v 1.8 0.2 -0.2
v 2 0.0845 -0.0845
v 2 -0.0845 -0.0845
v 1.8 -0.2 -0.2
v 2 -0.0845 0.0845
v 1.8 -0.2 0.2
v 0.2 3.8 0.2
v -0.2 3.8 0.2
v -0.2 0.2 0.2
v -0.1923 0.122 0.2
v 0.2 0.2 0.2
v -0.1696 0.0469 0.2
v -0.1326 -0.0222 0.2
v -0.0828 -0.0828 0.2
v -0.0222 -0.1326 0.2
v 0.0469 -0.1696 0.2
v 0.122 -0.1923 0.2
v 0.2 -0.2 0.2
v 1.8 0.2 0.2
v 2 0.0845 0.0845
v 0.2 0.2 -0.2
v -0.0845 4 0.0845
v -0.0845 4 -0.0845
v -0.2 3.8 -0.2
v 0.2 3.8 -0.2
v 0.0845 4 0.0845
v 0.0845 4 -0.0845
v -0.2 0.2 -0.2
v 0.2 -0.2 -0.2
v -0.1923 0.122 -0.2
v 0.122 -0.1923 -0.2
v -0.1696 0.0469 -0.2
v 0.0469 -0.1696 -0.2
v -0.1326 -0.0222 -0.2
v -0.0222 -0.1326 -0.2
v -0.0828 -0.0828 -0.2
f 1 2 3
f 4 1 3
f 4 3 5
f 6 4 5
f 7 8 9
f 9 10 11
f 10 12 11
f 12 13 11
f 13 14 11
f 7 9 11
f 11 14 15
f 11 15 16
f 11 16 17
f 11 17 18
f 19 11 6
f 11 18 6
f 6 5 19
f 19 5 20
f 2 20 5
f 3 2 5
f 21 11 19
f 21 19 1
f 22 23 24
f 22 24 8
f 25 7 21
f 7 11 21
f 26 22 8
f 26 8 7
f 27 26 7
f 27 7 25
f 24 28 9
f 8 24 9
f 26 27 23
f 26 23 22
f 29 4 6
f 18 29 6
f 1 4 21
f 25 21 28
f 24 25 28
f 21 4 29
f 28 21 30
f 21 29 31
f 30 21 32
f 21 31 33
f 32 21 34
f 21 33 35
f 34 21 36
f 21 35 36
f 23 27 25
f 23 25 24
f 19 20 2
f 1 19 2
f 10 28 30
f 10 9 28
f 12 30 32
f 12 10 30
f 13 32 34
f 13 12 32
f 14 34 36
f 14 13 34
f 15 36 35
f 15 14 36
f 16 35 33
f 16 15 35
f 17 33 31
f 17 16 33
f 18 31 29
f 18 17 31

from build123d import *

# Parameters (mm, degrees)
SKETCH2_W             = 0.4
SKETCH2_H             = 0.4
CHAMFER1_SIZE         = 0.2
CHAMFER1_SIZE2        = 0.115470054
CHAMFER1_PART_2_SIZE  = 0.2
CHAMFER1_PART_2_SIZE2 = 0.115470054
CHAMFER1_PART_3_SIZE  = 0.2
CHAMFER1_PART_3_SIZE2 = 0.115470054
CHAMFER1_PART_4_SIZE  = 0.2
CHAMFER1_PART_4_SIZE2 = 0.115470054
CHAMFER2_SIZE         = 0.2
CHAMFER2_SIZE2        = 0.115470054
CHAMFER2_PART_2_SIZE  = 0.2
CHAMFER2_PART_2_SIZE2 = 0.115470054
CHAMFER2_PART_3_SIZE  = 0.2
CHAMFER2_PART_3_SIZE2 = 0.115470054
CHAMFER2_PART_4_SIZE  = 0.2
CHAMFER2_PART_4_SIZE2 = 0.115470054


with BuildPart() as part:
    # Sweep1: sweep along a path in Sketch1
    with BuildLine(Plane.XY) as sweep1_path:
        Line((0, 4), (0, 0.2))
        ThreePointArc((0, 0.2), (0.058578644, 0.058578644), (0.2, 0))
        Line((0.2, 0), (2, 0))
    # Sketch2 → Sweep1 (sweep)
    with BuildSketch(Plane(origin=(0, 4, 0), x_dir=(1, 0, 0), z_dir=(0, 1, 0))):
        Rectangle(SKETCH2_W, SKETCH2_H)
    sweep(path=sweep1_path.line)

    # Chamfer1
    chamfer1_edges = [part.edges().sort_by_distance(p)[0] for p in [
        (0, 4, 0.2),
    ]]
    chamfer1_side = [part.faces().sort_by_distance(p)[0] for p in [
        (-0.152586922, 2.1, 0.2),
    ]]
    chamfer(chamfer1_edges, length=CHAMFER1_SIZE, length2=CHAMFER1_SIZE2, reference=chamfer1_side[0])

    # Chamfer1 part 2
    chamfer1_part_2_edges = [part.edges().sort_by_distance(p)[0] for p in [
        (-0.2, 4, 0),
    ]]
    chamfer1_part_2_side = [part.faces().sort_by_distance(p)[0] for p in [
        (-0.2, 2.1, 0),
    ]]
    chamfer(chamfer1_part_2_edges, length=CHAMFER1_PART_2_SIZE, length2=CHAMFER1_PART_2_SIZE2, reference=chamfer1_part_2_side[0])

    # Chamfer1 part 3
    chamfer1_part_3_edges = [part.edges().sort_by_distance(p)[0] for p in [
        (0, 4, -0.2),
    ]]
    chamfer1_part_3_side = [part.faces().sort_by_distance(p)[0] for p in [
        (0.152586922, 2.1, -0.2),
    ]]
    chamfer(chamfer1_part_3_edges, length=CHAMFER1_PART_3_SIZE, length2=CHAMFER1_PART_3_SIZE2, reference=chamfer1_part_3_side[0])

    # Chamfer1 part 4
    chamfer1_part_4_edges = [part.edges().sort_by_distance(p)[0] for p in [
        (0.2, 4, 0),
    ]]
    chamfer1_part_4_side = [part.faces().sort_by_distance(p)[0] for p in [
        (0.2, 2.1, 0),
    ]]
    chamfer(chamfer1_part_4_edges, length=CHAMFER1_PART_4_SIZE, length2=CHAMFER1_PART_4_SIZE2, reference=chamfer1_part_4_side[0])

    # Chamfer2
    chamfer2_edges = [part.edges().sort_by_distance(p)[0] for p in [
        (2, 0.2, 0),
    ]]
    chamfer2_side = [part.faces().sort_by_distance(p)[0] for p in [
        (1.1, 0.2, 0),
    ]]
    chamfer(chamfer2_edges, length=CHAMFER2_SIZE, length2=CHAMFER2_SIZE2, reference=chamfer2_side[0])

    # Chamfer2 part 2
    chamfer2_part_2_edges = [part.edges().sort_by_distance(p)[0] for p in [
        (2, 0, -0.2),
    ]]
    chamfer2_part_2_side = [part.faces().sort_by_distance(p)[0] for p in [
        (0.154349151, 2, -0.2),
    ]]
    chamfer(chamfer2_part_2_edges, length=CHAMFER2_PART_2_SIZE, length2=CHAMFER2_PART_2_SIZE2, reference=chamfer2_part_2_side[0])

    # Chamfer2 part 3
    chamfer2_part_3_edges = [part.edges().sort_by_distance(p)[0] for p in [
        (2, -0.2, 0),
    ]]
    chamfer2_part_3_side = [part.faces().sort_by_distance(p)[0] for p in [
        (1.1, -0.2, 0),
    ]]
    chamfer(chamfer2_part_3_edges, length=CHAMFER2_PART_3_SIZE, length2=CHAMFER2_PART_3_SIZE2, reference=chamfer2_part_3_side[0])

    # Chamfer2 part 4
    chamfer2_part_4_edges = [part.edges().sort_by_distance(p)[0] for p in [
        (2, 0, 0.2),
    ]]
    chamfer2_part_4_side = [part.faces().sort_by_distance(p)[0] for p in [
        (-0.154349151, 2, 0.2),
    ]]
    chamfer(chamfer2_part_4_edges, length=CHAMFER2_PART_4_SIZE, length2=CHAMFER2_PART_4_SIZE2, reference=chamfer2_part_4_side[0])


solid = part.part
